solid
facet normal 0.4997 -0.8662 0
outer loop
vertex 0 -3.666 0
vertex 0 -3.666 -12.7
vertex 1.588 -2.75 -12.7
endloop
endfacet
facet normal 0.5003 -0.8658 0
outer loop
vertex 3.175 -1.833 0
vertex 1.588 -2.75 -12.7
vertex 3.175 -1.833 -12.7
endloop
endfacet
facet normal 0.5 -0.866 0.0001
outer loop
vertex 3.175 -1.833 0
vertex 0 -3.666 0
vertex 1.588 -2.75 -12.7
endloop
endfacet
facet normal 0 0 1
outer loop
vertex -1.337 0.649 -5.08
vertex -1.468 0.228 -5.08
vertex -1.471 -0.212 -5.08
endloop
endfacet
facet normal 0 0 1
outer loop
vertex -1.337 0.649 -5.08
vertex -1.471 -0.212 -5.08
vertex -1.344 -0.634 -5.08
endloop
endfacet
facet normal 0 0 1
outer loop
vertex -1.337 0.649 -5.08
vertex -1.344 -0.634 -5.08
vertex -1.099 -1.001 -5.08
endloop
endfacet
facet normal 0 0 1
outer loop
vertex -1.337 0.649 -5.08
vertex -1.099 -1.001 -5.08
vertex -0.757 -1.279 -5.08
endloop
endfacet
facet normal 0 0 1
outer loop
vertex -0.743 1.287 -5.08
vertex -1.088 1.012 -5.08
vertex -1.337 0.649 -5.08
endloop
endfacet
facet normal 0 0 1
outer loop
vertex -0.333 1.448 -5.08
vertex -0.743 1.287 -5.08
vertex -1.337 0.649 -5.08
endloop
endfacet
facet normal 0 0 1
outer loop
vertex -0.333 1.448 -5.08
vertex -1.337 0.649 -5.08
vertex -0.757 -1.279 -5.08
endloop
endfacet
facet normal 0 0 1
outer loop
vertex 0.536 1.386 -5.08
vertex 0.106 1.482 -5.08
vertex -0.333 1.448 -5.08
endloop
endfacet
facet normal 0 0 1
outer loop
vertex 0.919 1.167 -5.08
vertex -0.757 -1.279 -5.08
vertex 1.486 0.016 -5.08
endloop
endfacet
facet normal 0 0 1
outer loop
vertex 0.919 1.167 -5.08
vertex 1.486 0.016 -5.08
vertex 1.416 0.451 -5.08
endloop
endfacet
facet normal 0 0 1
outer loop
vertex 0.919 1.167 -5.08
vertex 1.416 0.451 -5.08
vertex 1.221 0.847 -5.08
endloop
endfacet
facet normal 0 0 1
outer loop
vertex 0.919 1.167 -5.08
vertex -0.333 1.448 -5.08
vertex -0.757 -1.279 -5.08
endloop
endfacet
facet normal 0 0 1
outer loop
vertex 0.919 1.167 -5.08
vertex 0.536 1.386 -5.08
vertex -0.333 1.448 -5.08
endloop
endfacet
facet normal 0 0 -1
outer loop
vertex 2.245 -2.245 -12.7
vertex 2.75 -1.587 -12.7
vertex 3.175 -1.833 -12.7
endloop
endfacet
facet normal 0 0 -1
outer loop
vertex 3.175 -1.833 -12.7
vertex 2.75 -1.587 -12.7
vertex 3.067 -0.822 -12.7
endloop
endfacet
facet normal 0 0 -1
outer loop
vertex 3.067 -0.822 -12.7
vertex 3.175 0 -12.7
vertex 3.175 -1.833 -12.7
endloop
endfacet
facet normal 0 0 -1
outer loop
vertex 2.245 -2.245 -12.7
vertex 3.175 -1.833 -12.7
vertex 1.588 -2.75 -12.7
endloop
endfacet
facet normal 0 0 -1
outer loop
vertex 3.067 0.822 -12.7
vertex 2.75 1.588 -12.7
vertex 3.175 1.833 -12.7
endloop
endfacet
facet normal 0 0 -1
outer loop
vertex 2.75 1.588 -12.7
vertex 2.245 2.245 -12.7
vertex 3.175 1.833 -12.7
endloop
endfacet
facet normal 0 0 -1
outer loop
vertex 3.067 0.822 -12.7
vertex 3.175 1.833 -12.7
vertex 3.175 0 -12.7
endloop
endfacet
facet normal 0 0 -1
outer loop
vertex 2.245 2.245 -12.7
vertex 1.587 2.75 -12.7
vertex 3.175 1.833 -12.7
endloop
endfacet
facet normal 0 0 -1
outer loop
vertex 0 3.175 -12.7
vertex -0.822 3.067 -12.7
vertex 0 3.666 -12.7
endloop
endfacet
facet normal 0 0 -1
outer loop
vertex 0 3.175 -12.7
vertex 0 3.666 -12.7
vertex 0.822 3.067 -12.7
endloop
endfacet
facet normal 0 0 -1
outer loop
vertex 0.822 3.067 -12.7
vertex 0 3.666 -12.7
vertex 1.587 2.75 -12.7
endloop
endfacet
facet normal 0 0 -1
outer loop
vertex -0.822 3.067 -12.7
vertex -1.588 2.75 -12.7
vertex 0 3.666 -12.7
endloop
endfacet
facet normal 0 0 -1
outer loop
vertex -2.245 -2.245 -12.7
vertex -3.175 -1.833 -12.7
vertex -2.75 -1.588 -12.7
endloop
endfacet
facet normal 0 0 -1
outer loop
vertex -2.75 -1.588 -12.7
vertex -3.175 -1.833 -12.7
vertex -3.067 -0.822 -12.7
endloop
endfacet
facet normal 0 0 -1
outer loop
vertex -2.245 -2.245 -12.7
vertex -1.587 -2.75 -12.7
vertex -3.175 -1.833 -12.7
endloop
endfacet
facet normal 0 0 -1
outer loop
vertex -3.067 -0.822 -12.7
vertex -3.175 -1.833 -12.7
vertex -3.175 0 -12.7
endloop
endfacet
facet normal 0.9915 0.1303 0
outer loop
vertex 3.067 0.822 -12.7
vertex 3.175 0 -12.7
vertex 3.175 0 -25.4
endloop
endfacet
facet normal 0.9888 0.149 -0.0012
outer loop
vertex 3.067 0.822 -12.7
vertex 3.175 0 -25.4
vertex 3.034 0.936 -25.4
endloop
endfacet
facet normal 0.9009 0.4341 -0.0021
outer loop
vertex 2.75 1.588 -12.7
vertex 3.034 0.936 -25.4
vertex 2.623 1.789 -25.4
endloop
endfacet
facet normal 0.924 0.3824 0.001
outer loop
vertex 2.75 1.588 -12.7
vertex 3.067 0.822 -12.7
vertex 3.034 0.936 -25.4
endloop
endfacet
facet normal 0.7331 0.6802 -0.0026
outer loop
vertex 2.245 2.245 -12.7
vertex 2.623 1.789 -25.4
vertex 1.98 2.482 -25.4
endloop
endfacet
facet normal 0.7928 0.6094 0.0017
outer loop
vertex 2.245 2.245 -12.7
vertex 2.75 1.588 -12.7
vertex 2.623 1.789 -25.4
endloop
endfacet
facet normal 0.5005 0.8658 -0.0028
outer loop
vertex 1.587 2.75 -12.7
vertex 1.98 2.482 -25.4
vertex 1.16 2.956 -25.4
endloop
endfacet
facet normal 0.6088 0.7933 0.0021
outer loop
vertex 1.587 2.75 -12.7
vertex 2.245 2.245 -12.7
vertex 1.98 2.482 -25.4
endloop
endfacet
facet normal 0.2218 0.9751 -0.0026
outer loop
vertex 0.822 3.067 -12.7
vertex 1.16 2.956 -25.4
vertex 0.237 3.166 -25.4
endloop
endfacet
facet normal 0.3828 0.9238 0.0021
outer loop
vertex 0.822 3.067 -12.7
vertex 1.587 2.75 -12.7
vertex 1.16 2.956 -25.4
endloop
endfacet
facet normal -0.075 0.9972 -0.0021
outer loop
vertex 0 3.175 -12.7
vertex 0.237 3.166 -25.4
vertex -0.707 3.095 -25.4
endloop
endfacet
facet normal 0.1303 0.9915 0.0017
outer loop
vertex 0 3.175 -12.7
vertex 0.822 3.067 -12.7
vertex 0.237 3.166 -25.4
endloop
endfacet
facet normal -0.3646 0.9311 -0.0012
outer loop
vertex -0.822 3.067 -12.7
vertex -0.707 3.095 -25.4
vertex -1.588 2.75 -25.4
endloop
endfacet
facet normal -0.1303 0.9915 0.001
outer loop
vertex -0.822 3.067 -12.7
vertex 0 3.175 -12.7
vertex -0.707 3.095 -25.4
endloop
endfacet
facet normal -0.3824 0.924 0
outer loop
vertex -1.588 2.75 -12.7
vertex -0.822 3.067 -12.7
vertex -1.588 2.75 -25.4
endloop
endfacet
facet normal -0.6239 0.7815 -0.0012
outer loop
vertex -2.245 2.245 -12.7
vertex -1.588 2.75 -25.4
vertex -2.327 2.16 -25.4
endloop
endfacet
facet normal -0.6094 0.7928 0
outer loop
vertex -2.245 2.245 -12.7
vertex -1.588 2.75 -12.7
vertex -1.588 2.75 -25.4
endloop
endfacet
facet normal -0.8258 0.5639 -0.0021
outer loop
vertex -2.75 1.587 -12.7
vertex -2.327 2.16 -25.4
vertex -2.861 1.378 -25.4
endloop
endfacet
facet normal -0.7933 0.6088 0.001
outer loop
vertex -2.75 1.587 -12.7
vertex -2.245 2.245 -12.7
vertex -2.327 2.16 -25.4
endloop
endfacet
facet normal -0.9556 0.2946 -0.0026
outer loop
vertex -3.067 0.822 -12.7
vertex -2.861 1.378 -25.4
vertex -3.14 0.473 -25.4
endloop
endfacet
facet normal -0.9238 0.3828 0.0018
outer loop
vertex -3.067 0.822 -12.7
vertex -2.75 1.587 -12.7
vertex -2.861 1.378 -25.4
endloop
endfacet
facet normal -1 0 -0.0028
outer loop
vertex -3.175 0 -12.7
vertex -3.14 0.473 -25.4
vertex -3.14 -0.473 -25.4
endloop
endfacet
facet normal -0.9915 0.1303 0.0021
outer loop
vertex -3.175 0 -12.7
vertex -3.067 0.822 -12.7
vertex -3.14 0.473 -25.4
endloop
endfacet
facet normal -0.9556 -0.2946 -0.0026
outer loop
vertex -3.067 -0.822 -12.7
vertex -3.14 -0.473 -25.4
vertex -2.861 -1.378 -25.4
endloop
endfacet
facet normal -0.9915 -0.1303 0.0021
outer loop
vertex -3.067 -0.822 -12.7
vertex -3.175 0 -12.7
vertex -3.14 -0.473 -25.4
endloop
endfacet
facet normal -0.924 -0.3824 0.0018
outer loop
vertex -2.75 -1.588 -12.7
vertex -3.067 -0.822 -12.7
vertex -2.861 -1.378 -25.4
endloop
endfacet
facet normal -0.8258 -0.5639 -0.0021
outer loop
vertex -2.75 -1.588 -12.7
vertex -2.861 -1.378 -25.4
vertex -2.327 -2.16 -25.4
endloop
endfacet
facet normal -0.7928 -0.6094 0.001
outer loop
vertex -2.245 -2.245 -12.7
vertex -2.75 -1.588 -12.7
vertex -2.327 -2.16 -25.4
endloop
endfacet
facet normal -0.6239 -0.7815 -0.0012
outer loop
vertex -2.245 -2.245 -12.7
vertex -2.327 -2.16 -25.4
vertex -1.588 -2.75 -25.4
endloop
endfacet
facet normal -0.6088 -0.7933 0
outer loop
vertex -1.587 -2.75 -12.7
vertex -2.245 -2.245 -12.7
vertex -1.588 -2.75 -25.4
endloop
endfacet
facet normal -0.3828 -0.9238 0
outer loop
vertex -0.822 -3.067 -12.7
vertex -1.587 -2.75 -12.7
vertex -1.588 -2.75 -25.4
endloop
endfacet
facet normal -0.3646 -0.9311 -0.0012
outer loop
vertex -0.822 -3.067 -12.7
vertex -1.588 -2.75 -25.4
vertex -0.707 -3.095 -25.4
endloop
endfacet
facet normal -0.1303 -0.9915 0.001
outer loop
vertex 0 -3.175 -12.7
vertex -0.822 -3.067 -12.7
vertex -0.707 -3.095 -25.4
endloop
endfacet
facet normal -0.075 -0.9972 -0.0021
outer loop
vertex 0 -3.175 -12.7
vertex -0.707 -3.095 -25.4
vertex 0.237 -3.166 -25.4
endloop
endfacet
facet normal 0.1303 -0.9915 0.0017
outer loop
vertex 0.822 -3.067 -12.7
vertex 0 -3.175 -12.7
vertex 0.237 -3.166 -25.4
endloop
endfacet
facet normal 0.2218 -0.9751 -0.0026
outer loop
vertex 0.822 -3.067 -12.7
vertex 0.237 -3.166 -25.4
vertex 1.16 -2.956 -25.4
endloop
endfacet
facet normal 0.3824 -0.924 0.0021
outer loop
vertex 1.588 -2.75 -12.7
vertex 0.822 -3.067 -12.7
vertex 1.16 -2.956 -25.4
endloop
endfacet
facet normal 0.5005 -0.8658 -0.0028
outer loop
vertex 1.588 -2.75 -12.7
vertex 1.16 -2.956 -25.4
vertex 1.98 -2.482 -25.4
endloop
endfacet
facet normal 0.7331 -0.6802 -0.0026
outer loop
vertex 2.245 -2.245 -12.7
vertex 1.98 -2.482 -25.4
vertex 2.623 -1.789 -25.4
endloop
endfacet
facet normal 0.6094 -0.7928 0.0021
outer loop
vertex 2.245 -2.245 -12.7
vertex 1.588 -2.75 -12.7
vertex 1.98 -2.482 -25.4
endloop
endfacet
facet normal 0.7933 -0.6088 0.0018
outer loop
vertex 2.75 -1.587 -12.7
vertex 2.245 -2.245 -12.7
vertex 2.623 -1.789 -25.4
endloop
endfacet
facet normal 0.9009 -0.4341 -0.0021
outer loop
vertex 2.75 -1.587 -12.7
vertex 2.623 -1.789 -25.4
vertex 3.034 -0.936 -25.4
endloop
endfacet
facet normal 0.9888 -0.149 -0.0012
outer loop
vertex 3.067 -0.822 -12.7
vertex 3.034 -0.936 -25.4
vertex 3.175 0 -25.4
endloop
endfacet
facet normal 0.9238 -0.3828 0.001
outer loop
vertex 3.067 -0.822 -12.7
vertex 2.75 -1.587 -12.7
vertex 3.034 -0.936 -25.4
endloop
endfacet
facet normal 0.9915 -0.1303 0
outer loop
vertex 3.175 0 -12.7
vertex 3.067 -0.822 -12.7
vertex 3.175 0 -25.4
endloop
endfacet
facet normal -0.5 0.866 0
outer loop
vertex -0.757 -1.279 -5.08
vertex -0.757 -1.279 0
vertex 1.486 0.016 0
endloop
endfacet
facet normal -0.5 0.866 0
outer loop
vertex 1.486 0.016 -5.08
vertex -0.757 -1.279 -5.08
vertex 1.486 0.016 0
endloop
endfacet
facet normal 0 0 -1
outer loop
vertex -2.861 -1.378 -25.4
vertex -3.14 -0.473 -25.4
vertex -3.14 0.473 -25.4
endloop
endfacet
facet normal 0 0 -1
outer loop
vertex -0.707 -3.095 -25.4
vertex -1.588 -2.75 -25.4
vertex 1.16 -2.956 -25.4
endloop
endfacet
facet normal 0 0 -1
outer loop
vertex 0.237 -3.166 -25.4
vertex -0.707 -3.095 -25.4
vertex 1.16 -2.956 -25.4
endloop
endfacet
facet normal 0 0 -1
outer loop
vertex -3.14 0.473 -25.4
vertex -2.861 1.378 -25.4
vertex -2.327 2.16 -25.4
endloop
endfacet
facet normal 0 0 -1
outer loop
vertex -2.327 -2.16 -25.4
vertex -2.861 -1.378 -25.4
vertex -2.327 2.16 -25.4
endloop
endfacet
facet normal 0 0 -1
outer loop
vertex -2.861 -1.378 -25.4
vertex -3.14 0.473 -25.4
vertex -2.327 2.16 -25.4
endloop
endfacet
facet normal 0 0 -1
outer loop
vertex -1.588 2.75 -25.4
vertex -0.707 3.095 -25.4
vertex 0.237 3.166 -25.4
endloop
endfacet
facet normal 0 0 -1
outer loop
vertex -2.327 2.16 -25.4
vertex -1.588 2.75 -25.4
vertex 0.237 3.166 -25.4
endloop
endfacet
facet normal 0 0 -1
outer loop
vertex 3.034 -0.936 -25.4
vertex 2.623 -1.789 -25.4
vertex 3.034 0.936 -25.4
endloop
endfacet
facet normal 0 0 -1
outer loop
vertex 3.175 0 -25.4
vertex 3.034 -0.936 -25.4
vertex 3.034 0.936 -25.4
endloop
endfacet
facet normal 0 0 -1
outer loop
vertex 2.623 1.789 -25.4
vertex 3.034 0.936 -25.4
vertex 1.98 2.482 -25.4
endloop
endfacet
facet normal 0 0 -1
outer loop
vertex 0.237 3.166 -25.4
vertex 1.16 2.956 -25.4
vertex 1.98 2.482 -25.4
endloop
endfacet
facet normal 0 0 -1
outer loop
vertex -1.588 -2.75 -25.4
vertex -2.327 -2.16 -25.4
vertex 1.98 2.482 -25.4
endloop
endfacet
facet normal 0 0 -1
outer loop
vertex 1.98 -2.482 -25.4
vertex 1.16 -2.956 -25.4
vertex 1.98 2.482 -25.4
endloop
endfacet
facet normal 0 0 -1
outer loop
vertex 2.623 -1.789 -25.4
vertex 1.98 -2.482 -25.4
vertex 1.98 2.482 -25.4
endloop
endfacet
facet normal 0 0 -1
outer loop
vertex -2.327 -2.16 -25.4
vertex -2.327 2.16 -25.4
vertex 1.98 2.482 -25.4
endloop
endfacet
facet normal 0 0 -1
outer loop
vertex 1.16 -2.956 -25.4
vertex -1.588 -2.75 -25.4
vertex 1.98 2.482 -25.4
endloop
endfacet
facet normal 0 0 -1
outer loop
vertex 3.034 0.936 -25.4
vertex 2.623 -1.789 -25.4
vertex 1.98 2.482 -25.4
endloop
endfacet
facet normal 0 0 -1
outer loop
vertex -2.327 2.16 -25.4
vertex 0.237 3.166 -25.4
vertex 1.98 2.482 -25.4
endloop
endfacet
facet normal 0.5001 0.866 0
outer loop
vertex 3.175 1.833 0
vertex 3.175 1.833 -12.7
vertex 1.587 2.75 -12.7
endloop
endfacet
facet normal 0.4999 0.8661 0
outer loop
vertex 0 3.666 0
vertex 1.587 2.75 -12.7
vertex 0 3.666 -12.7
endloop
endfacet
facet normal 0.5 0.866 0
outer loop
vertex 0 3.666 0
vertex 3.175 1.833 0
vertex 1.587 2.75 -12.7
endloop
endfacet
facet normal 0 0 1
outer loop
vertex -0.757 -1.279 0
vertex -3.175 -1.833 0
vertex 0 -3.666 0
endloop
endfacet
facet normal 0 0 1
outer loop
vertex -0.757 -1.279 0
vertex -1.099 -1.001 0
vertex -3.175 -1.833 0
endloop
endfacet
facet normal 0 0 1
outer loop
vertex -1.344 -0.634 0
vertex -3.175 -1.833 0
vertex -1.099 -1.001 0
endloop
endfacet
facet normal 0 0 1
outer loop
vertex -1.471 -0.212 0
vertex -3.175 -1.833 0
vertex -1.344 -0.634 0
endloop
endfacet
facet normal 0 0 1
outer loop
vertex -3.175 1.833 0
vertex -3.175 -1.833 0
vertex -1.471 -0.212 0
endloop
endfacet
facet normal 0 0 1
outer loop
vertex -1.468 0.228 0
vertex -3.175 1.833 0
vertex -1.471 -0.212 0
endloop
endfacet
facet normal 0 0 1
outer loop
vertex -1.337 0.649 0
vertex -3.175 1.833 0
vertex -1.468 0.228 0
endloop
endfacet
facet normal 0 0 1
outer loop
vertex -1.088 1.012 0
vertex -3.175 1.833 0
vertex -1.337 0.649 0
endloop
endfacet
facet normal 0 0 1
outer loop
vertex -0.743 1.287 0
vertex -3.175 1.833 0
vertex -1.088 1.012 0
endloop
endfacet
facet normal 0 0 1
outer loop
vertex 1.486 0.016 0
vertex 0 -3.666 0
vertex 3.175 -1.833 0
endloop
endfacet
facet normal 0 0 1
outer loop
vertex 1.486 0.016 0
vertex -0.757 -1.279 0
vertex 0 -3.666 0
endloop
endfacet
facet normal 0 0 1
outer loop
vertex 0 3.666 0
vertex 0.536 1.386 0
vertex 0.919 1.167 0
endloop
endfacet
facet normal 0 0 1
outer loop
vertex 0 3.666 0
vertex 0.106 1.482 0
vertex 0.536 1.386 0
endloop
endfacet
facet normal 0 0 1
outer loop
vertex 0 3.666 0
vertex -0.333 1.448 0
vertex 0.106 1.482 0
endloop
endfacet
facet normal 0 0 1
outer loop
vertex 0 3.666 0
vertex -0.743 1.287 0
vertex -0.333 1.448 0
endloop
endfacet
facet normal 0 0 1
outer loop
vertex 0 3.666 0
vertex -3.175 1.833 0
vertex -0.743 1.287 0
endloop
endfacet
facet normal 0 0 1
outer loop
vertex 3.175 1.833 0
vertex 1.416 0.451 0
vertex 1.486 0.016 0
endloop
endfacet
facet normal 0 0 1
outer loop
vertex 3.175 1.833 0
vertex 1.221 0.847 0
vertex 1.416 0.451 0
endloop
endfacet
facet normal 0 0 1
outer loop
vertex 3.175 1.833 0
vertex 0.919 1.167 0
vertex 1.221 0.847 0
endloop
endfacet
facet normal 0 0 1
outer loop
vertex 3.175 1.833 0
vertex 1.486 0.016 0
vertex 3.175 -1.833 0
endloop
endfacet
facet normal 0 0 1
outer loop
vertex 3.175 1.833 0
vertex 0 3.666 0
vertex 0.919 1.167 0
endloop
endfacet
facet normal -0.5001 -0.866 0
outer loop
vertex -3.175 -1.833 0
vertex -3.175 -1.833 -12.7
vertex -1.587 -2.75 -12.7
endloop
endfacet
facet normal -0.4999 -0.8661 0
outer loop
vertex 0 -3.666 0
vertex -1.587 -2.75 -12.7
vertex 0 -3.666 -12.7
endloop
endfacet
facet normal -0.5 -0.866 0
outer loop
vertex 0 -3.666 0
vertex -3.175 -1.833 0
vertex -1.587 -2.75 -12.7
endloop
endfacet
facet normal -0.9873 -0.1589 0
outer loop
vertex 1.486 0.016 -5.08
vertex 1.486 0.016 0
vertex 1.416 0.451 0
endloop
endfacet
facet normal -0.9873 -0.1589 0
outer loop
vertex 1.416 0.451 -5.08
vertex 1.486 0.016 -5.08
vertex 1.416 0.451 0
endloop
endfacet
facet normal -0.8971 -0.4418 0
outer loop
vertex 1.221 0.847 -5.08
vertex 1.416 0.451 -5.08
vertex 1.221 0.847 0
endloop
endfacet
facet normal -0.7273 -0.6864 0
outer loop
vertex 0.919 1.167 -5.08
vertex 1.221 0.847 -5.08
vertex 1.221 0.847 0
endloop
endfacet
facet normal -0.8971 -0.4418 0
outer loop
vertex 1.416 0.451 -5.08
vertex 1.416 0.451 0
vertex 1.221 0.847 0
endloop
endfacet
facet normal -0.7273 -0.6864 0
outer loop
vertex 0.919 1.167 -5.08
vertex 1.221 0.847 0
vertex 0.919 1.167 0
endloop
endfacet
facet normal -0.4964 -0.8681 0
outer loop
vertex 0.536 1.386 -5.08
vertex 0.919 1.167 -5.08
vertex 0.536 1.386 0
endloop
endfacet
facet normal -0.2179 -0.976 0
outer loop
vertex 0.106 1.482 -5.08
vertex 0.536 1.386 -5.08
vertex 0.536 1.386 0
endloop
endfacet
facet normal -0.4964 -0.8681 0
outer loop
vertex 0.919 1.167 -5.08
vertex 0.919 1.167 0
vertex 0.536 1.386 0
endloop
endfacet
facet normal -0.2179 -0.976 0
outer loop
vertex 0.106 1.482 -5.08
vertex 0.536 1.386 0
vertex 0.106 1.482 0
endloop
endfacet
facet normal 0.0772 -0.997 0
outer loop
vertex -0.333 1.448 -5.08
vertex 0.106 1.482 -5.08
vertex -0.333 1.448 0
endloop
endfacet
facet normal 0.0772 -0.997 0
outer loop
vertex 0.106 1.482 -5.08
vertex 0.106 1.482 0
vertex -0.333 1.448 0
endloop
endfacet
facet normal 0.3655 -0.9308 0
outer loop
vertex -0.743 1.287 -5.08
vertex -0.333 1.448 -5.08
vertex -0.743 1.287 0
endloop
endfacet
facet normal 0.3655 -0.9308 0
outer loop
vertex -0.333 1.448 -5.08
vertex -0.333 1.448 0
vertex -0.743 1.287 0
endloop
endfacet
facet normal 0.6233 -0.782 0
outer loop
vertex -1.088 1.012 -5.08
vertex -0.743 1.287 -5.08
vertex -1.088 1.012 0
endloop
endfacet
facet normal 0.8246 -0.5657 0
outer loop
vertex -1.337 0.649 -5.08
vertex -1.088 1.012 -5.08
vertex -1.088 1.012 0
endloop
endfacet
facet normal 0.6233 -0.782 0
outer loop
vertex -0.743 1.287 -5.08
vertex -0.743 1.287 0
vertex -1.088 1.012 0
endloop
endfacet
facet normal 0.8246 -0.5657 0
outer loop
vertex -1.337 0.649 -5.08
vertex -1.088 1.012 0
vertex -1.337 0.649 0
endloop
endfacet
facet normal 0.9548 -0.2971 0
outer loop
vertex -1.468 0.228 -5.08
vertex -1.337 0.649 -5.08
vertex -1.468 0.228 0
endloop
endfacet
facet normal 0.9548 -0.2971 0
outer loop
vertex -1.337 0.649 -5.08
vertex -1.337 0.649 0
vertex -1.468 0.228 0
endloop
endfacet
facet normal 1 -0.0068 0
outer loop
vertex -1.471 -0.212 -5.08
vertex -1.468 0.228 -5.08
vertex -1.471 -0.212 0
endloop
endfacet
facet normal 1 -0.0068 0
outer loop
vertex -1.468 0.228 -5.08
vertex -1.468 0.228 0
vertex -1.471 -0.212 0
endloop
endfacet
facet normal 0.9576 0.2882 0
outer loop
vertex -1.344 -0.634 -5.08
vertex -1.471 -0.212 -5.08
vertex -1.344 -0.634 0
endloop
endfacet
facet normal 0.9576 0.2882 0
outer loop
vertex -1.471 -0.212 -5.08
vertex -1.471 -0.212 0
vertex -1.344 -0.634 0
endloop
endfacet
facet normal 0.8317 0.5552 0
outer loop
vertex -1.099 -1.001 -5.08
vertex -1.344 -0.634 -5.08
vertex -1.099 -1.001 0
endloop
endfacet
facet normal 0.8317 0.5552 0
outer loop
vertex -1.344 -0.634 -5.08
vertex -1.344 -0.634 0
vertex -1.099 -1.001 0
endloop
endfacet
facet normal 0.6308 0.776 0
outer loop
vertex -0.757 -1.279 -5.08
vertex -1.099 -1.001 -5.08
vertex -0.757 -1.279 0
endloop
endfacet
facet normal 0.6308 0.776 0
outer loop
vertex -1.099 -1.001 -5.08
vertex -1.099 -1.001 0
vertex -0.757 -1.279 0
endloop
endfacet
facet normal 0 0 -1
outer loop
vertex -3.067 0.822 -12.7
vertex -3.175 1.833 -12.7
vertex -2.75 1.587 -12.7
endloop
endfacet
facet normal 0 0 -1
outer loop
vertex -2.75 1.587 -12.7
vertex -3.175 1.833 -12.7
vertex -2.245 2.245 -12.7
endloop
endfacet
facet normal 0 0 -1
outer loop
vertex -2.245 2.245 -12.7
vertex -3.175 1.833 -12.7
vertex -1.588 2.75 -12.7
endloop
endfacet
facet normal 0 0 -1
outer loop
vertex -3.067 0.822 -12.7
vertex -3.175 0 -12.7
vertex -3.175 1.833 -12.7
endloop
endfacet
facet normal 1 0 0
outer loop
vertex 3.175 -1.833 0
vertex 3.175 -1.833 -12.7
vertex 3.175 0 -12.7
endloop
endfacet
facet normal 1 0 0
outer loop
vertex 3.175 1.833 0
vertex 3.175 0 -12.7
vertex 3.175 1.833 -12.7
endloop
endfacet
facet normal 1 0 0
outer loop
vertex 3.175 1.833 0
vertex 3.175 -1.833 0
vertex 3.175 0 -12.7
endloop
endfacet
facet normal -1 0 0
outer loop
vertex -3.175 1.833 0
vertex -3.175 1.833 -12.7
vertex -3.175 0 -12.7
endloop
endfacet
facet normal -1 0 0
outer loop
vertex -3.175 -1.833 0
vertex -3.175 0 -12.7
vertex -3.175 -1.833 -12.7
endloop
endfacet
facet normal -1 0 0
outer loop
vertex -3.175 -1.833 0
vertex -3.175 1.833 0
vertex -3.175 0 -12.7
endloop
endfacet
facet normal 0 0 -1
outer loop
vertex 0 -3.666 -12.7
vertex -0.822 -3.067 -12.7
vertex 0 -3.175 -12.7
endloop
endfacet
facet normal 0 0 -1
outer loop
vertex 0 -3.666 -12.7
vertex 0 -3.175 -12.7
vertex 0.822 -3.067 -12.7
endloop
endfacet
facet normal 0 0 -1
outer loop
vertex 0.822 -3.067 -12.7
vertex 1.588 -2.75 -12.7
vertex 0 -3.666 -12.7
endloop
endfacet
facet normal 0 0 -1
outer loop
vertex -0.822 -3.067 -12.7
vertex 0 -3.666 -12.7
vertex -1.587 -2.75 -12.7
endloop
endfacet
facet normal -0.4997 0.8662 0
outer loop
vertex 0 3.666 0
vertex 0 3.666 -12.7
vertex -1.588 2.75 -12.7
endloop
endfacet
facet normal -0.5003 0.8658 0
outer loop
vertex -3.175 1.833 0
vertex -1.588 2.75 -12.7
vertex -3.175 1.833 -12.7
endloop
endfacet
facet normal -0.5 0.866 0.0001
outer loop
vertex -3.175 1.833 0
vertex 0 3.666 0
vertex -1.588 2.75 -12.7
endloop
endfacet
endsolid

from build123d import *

# Parameters (mm, degrees)
BOSS_EXTRUDE1_DEPTH = 25.4
CUT_EXTRUDE1_DEPTH  = 5.08
SKETCH3_OUTSIDE_W   = 13.788
SKETCH3_OUTSIDE_H   = 14.77
SKETCH3_OUTSIDE_R   = 3.175
CUT_EXTRUDE2_DEPTH  = 13.7


with BuildPart() as part:
    # Sketch1 → Boss-Extrude1 (new body)
    with BuildSketch(Plane.XY):
        Polygon((0, 3.666174209), (-3.175, 1.833087105), (-3.175, -1.833087105), (0, -3.666174209), (3.175, -1.833087105), (3.175, 1.833087105), align=None)
    extrude(amount=-BOSS_EXTRUDE1_DEPTH)

    # Sketch2 → Cut-Extrude1 (cut)
    with BuildSketch(Plane.XY):
        with BuildLine():
            Line((-0.756832981, -1.278711324), (1.485812981, 0.016080926))
            ThreePointArc((1.485812981, 0.016080926), (-0.74295, 1.286827147), (-0.756832981, -1.278711324))
        make_face()
    extrude(amount=-CUT_EXTRUDE1_DEPTH, mode=Mode.SUBTRACT)

    # Sketch3 outside → Cut-Extrude2 (cut, through all)
    with BuildSketch(Plane.XY.offset(-12.7)):
        Rectangle(SKETCH3_OUTSIDE_W, SKETCH3_OUTSIDE_H)
        Circle(SKETCH3_OUTSIDE_R, mode=Mode.SUBTRACT)
    extrude(amount=-CUT_EXTRUDE2_DEPTH, mode=Mode.SUBTRACT)


solid = part.part
